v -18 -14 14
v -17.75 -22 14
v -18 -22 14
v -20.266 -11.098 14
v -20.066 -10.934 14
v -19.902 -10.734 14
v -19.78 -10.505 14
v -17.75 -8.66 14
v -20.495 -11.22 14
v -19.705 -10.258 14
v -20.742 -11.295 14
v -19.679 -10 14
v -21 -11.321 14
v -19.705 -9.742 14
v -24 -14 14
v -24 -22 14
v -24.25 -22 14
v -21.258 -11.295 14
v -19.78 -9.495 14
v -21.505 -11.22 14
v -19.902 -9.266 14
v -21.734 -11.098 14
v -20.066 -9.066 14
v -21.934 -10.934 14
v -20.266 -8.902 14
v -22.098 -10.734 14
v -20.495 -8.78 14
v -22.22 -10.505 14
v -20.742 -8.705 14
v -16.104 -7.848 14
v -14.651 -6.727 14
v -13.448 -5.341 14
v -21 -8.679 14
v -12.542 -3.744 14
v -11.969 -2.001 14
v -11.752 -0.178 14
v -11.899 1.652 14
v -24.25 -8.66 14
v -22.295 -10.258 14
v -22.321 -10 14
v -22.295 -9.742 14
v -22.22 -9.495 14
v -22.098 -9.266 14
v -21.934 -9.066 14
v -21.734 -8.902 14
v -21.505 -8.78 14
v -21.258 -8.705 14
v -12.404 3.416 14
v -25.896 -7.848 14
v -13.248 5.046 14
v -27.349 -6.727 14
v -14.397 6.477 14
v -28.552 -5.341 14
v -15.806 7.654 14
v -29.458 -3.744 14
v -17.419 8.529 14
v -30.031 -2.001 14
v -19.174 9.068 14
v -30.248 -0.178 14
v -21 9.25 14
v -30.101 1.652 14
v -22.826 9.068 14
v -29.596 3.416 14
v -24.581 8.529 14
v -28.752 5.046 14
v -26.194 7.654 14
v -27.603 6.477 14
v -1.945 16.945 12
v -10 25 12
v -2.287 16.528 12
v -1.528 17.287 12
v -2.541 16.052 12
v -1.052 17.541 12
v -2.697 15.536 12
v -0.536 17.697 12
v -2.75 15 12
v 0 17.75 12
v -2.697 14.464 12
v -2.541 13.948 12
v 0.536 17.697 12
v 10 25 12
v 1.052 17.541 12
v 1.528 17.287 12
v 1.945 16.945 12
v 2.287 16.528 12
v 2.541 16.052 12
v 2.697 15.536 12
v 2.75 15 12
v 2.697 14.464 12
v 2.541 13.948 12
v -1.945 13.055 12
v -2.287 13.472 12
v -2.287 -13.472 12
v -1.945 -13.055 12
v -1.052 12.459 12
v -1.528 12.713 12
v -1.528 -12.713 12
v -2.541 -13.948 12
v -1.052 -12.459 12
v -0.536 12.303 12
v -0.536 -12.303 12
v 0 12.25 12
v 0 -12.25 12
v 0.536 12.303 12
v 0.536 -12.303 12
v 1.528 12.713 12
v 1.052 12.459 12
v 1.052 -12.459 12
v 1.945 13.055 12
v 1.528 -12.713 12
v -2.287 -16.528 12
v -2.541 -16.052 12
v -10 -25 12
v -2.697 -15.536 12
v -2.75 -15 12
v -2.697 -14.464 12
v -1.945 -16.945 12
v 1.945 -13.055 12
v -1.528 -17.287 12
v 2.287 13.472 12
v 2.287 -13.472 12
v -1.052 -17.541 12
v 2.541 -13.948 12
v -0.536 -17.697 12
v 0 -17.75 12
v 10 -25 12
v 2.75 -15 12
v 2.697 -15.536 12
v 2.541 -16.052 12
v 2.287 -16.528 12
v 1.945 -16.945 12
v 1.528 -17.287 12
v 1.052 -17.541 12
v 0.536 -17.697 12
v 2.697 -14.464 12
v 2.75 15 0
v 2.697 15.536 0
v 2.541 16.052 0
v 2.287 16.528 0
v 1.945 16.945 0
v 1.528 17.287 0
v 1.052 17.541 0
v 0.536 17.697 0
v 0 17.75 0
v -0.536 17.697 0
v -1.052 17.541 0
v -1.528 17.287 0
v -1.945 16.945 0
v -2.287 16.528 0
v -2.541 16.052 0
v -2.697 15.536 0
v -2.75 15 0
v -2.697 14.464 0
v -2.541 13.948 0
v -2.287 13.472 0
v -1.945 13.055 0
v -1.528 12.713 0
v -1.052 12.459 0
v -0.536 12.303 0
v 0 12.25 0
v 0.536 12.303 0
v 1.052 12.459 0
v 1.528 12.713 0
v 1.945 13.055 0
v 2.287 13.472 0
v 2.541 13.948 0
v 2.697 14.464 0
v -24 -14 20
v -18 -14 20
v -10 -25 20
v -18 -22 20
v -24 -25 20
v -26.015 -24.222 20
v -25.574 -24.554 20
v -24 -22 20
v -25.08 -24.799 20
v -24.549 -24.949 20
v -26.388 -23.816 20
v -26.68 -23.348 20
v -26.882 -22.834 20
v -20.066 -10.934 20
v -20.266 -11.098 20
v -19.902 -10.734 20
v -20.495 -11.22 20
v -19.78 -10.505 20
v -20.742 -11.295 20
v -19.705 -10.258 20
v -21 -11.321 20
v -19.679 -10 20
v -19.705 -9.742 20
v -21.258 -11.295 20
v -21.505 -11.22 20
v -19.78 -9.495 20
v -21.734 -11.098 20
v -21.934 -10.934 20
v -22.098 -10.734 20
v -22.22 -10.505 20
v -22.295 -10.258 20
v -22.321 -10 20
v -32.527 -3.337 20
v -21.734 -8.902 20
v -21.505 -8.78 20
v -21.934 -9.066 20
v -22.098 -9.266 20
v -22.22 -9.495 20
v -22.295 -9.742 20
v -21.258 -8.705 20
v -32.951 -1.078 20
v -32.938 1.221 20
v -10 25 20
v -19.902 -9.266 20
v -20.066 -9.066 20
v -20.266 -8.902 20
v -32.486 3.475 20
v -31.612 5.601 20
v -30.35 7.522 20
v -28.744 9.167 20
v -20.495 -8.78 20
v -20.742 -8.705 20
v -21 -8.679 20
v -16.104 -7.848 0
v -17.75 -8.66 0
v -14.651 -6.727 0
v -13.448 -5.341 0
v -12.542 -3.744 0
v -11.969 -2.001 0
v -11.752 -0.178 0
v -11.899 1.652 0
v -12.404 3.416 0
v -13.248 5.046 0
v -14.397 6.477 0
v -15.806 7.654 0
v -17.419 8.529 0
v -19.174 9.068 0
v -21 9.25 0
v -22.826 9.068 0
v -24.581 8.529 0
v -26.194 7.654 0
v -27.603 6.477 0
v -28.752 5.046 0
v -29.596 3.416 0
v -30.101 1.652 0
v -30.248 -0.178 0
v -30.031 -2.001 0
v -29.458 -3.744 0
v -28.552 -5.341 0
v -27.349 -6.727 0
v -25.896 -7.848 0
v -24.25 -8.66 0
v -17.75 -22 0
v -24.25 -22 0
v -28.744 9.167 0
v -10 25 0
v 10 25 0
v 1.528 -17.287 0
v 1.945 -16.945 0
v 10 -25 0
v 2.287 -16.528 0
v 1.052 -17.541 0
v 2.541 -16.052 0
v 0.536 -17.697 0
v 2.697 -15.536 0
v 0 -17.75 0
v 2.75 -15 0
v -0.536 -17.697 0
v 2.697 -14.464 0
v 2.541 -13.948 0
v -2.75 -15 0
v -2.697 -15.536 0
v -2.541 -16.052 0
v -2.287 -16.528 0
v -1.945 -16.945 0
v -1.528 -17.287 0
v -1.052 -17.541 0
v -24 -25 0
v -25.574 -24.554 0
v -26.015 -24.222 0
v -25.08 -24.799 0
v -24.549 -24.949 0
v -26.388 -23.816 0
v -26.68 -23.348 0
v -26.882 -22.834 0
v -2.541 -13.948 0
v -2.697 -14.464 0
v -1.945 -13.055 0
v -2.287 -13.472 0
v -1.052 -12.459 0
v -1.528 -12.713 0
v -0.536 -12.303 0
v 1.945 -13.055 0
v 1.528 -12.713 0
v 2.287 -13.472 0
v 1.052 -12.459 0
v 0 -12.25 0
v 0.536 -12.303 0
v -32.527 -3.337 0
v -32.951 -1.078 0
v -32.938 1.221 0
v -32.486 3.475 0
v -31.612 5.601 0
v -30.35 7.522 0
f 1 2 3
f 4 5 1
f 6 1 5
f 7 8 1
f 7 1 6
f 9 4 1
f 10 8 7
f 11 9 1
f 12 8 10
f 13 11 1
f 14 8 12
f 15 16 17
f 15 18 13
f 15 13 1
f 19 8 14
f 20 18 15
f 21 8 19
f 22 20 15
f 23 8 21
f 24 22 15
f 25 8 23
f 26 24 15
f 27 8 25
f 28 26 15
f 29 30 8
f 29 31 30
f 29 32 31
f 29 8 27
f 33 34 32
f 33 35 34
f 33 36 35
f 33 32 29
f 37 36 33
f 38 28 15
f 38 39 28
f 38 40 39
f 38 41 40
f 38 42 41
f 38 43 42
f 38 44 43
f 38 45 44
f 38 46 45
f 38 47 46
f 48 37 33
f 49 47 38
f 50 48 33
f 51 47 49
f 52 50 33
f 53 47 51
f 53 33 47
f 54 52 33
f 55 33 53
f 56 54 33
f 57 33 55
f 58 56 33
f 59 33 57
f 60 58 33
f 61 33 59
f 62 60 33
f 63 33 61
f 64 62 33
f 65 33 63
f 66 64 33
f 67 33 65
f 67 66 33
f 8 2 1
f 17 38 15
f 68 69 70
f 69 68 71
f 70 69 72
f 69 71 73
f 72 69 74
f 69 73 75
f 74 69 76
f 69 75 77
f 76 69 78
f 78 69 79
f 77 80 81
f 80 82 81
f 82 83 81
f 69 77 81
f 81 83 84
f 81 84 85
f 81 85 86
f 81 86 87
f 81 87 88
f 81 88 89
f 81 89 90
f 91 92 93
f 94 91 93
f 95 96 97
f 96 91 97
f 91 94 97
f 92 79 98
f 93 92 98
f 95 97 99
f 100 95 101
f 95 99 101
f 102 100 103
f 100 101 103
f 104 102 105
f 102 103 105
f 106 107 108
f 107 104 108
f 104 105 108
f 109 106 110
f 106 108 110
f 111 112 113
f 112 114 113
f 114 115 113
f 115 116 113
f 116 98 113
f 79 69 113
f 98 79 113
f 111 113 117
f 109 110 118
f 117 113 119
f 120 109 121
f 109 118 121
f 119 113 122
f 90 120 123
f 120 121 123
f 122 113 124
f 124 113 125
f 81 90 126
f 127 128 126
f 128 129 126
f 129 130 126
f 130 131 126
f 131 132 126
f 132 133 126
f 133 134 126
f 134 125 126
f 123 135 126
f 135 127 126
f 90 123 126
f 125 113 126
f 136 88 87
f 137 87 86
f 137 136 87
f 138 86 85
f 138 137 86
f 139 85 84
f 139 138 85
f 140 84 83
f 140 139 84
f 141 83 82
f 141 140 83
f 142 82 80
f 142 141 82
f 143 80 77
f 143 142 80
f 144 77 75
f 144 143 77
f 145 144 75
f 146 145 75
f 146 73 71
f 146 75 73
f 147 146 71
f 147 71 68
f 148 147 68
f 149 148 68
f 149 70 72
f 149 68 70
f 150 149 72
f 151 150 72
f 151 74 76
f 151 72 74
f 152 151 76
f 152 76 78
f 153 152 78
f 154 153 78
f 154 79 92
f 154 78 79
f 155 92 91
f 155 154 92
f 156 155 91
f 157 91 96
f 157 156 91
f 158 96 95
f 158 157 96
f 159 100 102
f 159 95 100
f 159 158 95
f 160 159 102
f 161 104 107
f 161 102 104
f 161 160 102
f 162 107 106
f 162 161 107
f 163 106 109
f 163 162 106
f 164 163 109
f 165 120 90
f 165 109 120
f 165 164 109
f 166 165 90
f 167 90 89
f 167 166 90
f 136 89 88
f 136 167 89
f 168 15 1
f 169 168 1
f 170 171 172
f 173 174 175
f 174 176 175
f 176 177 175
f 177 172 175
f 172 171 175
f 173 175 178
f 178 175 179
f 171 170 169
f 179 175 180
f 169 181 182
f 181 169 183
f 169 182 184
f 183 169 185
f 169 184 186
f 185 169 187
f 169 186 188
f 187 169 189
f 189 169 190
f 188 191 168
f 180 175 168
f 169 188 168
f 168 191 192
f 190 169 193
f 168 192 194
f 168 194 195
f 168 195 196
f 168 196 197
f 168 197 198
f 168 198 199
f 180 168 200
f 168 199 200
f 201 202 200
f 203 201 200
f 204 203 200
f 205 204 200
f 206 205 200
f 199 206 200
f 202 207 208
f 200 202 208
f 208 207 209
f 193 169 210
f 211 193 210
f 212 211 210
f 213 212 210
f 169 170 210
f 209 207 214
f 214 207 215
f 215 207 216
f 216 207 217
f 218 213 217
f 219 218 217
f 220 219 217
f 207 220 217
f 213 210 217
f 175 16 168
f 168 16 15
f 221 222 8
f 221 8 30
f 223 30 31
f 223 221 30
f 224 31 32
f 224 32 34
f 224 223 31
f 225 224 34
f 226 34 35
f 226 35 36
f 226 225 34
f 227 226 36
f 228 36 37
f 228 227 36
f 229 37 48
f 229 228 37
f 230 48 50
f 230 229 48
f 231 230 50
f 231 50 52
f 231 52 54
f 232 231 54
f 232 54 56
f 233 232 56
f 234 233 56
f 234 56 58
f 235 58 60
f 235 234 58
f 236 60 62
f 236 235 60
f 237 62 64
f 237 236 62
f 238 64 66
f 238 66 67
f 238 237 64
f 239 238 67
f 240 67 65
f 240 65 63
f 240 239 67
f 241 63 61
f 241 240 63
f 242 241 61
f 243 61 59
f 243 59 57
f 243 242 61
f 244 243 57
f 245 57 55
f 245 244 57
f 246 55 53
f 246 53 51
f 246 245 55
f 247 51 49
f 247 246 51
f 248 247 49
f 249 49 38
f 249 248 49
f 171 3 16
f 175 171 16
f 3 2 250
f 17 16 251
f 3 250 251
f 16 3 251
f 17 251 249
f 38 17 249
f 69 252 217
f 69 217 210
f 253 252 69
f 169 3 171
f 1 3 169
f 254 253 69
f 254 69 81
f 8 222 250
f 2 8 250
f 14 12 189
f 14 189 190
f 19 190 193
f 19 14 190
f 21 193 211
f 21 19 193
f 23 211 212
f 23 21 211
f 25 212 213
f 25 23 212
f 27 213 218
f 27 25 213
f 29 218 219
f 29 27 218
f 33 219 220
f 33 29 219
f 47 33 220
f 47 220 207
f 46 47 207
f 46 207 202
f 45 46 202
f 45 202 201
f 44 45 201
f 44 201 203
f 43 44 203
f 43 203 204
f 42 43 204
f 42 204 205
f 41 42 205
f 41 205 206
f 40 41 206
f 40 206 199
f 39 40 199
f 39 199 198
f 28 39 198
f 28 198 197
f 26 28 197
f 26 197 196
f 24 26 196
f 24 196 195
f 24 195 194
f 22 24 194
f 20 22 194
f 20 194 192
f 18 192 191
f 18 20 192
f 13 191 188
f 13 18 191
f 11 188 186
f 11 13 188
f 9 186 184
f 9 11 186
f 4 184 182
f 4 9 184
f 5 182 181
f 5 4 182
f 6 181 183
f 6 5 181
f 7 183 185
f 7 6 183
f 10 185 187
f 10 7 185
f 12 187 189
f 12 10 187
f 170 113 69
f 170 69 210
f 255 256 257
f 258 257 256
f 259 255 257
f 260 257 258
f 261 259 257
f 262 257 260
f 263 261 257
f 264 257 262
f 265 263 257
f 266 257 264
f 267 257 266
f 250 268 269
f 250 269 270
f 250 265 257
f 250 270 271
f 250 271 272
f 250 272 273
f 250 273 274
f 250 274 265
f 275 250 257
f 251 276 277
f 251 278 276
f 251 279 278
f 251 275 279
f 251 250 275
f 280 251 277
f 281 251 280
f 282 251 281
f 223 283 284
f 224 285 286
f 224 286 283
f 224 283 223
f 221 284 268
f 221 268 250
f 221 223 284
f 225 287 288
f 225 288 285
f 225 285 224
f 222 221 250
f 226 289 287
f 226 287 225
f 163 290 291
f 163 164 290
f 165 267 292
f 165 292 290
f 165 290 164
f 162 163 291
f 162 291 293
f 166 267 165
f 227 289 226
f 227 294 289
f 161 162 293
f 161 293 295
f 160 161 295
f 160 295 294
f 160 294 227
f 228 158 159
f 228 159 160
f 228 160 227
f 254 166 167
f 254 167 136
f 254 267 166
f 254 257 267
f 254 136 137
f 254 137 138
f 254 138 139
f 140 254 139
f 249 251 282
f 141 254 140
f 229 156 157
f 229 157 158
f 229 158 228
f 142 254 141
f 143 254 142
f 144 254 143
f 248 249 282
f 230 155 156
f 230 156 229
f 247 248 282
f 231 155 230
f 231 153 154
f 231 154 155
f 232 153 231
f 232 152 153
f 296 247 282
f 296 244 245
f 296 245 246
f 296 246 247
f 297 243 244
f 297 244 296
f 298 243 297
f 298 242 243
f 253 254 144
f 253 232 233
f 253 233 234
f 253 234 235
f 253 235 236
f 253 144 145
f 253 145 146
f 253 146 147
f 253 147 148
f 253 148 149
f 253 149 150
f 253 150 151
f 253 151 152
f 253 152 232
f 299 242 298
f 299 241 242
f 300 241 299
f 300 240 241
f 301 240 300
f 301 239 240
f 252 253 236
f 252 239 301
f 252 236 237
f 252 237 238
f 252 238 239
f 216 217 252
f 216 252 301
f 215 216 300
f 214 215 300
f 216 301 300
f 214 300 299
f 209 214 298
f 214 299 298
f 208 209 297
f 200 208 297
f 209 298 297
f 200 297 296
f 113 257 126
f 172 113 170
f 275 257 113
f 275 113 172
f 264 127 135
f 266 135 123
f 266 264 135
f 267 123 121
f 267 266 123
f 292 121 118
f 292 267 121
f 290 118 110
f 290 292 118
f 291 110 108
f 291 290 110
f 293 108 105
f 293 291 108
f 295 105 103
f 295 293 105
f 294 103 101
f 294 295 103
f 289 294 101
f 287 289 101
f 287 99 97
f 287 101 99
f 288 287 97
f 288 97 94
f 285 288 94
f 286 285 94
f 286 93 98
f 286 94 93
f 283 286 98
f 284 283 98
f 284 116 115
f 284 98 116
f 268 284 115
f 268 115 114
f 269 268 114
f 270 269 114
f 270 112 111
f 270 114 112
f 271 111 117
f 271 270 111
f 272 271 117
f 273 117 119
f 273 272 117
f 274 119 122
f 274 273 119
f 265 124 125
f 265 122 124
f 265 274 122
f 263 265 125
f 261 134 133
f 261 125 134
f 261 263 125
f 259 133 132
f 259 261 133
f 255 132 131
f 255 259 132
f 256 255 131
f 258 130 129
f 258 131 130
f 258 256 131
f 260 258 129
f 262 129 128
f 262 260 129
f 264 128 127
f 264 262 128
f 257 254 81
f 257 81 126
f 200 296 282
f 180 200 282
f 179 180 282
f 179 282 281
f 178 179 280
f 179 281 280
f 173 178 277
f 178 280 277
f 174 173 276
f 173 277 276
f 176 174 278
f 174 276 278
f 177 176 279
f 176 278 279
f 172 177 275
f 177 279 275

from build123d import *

# Parameters (mm, degrees)
SKETCH140_R          = 2.75
SKETCH140_R_2        = 1.3208
SKETCH140_W          = 6
SKETCH140_H          = 8
PAD083_DEPTH         = 20
POCKET048_DEPTH      = 14
SKETCH160_W          = 20
SKETCH160_H          = 20
POCKET059_DEPTH      = 25.001
POCKET059_DEPTH_BACK = 25.001


with BuildPart() as part:
    # Sketch140 → Pad083 (new body)
    with BuildSketch(Plane.XY):
        with BuildLine():
            Line((-28.743574, 9.167173), (-10, 25))
            Line((-10, 25), (10, 25))
            Line((10, 25), (10, -25))
            Line((10, -25), (-10, -25))
            Line((-10, -25), (-24, -25))
            ThreePointArc((-26.88165, -22.83432), (-25.802365, -24.398224), (-24, -25))
            Line((-32.526602, -3.337282), (-26.88165, -22.83432))
            ThreePointArc((-28.743574, 9.167173), (-32.485873, 3.474872), (-32.526602, -3.337282))
        make_face()
        with Locations((0, 15)):
            Circle(SKETCH140_R, mode=Mode.SUBTRACT)
        with Locations((0, -15)):
            Circle(SKETCH140_R, mode=Mode.SUBTRACT)
        with Locations((-21, -10)):
            Circle(SKETCH140_R_2, mode=Mode.SUBTRACT)
        with Locations((-21, -18)):
            Rectangle(SKETCH140_W, SKETCH140_H, mode=Mode.SUBTRACT)
    extrude(amount=PAD083_DEPTH)

    # Sketch141 → Pocket048 (cut)
    with BuildSketch(Plane.XY):
        with BuildLine():
            Line((-17.75, -8.660254), (-17.75, -22))
            Line((-17.75, -22), (-24.25, -22))
            Line((-24.25, -22), (-24.25, -8.660254))
            ThreePointArc((-17.75, -8.660254), (-21, 9.25), (-24.25, -8.660254))
        make_face()
    extrude(amount=POCKET048_DEPTH, mode=Mode.SUBTRACT)

    # Sketch160 → Pocket059 (cut, two sides)
    with BuildSketch(Plane.XZ) as pocket059_sk:
        with Locations((0, 22)):
            Rectangle(SKETCH160_W, SKETCH160_H)
    extrude(amount=-POCKET059_DEPTH, mode=Mode.SUBTRACT)
    extrude(pocket059_sk.sketch, amount=POCKET059_DEPTH_BACK, mode=Mode.SUBTRACT)


solid = part.part
